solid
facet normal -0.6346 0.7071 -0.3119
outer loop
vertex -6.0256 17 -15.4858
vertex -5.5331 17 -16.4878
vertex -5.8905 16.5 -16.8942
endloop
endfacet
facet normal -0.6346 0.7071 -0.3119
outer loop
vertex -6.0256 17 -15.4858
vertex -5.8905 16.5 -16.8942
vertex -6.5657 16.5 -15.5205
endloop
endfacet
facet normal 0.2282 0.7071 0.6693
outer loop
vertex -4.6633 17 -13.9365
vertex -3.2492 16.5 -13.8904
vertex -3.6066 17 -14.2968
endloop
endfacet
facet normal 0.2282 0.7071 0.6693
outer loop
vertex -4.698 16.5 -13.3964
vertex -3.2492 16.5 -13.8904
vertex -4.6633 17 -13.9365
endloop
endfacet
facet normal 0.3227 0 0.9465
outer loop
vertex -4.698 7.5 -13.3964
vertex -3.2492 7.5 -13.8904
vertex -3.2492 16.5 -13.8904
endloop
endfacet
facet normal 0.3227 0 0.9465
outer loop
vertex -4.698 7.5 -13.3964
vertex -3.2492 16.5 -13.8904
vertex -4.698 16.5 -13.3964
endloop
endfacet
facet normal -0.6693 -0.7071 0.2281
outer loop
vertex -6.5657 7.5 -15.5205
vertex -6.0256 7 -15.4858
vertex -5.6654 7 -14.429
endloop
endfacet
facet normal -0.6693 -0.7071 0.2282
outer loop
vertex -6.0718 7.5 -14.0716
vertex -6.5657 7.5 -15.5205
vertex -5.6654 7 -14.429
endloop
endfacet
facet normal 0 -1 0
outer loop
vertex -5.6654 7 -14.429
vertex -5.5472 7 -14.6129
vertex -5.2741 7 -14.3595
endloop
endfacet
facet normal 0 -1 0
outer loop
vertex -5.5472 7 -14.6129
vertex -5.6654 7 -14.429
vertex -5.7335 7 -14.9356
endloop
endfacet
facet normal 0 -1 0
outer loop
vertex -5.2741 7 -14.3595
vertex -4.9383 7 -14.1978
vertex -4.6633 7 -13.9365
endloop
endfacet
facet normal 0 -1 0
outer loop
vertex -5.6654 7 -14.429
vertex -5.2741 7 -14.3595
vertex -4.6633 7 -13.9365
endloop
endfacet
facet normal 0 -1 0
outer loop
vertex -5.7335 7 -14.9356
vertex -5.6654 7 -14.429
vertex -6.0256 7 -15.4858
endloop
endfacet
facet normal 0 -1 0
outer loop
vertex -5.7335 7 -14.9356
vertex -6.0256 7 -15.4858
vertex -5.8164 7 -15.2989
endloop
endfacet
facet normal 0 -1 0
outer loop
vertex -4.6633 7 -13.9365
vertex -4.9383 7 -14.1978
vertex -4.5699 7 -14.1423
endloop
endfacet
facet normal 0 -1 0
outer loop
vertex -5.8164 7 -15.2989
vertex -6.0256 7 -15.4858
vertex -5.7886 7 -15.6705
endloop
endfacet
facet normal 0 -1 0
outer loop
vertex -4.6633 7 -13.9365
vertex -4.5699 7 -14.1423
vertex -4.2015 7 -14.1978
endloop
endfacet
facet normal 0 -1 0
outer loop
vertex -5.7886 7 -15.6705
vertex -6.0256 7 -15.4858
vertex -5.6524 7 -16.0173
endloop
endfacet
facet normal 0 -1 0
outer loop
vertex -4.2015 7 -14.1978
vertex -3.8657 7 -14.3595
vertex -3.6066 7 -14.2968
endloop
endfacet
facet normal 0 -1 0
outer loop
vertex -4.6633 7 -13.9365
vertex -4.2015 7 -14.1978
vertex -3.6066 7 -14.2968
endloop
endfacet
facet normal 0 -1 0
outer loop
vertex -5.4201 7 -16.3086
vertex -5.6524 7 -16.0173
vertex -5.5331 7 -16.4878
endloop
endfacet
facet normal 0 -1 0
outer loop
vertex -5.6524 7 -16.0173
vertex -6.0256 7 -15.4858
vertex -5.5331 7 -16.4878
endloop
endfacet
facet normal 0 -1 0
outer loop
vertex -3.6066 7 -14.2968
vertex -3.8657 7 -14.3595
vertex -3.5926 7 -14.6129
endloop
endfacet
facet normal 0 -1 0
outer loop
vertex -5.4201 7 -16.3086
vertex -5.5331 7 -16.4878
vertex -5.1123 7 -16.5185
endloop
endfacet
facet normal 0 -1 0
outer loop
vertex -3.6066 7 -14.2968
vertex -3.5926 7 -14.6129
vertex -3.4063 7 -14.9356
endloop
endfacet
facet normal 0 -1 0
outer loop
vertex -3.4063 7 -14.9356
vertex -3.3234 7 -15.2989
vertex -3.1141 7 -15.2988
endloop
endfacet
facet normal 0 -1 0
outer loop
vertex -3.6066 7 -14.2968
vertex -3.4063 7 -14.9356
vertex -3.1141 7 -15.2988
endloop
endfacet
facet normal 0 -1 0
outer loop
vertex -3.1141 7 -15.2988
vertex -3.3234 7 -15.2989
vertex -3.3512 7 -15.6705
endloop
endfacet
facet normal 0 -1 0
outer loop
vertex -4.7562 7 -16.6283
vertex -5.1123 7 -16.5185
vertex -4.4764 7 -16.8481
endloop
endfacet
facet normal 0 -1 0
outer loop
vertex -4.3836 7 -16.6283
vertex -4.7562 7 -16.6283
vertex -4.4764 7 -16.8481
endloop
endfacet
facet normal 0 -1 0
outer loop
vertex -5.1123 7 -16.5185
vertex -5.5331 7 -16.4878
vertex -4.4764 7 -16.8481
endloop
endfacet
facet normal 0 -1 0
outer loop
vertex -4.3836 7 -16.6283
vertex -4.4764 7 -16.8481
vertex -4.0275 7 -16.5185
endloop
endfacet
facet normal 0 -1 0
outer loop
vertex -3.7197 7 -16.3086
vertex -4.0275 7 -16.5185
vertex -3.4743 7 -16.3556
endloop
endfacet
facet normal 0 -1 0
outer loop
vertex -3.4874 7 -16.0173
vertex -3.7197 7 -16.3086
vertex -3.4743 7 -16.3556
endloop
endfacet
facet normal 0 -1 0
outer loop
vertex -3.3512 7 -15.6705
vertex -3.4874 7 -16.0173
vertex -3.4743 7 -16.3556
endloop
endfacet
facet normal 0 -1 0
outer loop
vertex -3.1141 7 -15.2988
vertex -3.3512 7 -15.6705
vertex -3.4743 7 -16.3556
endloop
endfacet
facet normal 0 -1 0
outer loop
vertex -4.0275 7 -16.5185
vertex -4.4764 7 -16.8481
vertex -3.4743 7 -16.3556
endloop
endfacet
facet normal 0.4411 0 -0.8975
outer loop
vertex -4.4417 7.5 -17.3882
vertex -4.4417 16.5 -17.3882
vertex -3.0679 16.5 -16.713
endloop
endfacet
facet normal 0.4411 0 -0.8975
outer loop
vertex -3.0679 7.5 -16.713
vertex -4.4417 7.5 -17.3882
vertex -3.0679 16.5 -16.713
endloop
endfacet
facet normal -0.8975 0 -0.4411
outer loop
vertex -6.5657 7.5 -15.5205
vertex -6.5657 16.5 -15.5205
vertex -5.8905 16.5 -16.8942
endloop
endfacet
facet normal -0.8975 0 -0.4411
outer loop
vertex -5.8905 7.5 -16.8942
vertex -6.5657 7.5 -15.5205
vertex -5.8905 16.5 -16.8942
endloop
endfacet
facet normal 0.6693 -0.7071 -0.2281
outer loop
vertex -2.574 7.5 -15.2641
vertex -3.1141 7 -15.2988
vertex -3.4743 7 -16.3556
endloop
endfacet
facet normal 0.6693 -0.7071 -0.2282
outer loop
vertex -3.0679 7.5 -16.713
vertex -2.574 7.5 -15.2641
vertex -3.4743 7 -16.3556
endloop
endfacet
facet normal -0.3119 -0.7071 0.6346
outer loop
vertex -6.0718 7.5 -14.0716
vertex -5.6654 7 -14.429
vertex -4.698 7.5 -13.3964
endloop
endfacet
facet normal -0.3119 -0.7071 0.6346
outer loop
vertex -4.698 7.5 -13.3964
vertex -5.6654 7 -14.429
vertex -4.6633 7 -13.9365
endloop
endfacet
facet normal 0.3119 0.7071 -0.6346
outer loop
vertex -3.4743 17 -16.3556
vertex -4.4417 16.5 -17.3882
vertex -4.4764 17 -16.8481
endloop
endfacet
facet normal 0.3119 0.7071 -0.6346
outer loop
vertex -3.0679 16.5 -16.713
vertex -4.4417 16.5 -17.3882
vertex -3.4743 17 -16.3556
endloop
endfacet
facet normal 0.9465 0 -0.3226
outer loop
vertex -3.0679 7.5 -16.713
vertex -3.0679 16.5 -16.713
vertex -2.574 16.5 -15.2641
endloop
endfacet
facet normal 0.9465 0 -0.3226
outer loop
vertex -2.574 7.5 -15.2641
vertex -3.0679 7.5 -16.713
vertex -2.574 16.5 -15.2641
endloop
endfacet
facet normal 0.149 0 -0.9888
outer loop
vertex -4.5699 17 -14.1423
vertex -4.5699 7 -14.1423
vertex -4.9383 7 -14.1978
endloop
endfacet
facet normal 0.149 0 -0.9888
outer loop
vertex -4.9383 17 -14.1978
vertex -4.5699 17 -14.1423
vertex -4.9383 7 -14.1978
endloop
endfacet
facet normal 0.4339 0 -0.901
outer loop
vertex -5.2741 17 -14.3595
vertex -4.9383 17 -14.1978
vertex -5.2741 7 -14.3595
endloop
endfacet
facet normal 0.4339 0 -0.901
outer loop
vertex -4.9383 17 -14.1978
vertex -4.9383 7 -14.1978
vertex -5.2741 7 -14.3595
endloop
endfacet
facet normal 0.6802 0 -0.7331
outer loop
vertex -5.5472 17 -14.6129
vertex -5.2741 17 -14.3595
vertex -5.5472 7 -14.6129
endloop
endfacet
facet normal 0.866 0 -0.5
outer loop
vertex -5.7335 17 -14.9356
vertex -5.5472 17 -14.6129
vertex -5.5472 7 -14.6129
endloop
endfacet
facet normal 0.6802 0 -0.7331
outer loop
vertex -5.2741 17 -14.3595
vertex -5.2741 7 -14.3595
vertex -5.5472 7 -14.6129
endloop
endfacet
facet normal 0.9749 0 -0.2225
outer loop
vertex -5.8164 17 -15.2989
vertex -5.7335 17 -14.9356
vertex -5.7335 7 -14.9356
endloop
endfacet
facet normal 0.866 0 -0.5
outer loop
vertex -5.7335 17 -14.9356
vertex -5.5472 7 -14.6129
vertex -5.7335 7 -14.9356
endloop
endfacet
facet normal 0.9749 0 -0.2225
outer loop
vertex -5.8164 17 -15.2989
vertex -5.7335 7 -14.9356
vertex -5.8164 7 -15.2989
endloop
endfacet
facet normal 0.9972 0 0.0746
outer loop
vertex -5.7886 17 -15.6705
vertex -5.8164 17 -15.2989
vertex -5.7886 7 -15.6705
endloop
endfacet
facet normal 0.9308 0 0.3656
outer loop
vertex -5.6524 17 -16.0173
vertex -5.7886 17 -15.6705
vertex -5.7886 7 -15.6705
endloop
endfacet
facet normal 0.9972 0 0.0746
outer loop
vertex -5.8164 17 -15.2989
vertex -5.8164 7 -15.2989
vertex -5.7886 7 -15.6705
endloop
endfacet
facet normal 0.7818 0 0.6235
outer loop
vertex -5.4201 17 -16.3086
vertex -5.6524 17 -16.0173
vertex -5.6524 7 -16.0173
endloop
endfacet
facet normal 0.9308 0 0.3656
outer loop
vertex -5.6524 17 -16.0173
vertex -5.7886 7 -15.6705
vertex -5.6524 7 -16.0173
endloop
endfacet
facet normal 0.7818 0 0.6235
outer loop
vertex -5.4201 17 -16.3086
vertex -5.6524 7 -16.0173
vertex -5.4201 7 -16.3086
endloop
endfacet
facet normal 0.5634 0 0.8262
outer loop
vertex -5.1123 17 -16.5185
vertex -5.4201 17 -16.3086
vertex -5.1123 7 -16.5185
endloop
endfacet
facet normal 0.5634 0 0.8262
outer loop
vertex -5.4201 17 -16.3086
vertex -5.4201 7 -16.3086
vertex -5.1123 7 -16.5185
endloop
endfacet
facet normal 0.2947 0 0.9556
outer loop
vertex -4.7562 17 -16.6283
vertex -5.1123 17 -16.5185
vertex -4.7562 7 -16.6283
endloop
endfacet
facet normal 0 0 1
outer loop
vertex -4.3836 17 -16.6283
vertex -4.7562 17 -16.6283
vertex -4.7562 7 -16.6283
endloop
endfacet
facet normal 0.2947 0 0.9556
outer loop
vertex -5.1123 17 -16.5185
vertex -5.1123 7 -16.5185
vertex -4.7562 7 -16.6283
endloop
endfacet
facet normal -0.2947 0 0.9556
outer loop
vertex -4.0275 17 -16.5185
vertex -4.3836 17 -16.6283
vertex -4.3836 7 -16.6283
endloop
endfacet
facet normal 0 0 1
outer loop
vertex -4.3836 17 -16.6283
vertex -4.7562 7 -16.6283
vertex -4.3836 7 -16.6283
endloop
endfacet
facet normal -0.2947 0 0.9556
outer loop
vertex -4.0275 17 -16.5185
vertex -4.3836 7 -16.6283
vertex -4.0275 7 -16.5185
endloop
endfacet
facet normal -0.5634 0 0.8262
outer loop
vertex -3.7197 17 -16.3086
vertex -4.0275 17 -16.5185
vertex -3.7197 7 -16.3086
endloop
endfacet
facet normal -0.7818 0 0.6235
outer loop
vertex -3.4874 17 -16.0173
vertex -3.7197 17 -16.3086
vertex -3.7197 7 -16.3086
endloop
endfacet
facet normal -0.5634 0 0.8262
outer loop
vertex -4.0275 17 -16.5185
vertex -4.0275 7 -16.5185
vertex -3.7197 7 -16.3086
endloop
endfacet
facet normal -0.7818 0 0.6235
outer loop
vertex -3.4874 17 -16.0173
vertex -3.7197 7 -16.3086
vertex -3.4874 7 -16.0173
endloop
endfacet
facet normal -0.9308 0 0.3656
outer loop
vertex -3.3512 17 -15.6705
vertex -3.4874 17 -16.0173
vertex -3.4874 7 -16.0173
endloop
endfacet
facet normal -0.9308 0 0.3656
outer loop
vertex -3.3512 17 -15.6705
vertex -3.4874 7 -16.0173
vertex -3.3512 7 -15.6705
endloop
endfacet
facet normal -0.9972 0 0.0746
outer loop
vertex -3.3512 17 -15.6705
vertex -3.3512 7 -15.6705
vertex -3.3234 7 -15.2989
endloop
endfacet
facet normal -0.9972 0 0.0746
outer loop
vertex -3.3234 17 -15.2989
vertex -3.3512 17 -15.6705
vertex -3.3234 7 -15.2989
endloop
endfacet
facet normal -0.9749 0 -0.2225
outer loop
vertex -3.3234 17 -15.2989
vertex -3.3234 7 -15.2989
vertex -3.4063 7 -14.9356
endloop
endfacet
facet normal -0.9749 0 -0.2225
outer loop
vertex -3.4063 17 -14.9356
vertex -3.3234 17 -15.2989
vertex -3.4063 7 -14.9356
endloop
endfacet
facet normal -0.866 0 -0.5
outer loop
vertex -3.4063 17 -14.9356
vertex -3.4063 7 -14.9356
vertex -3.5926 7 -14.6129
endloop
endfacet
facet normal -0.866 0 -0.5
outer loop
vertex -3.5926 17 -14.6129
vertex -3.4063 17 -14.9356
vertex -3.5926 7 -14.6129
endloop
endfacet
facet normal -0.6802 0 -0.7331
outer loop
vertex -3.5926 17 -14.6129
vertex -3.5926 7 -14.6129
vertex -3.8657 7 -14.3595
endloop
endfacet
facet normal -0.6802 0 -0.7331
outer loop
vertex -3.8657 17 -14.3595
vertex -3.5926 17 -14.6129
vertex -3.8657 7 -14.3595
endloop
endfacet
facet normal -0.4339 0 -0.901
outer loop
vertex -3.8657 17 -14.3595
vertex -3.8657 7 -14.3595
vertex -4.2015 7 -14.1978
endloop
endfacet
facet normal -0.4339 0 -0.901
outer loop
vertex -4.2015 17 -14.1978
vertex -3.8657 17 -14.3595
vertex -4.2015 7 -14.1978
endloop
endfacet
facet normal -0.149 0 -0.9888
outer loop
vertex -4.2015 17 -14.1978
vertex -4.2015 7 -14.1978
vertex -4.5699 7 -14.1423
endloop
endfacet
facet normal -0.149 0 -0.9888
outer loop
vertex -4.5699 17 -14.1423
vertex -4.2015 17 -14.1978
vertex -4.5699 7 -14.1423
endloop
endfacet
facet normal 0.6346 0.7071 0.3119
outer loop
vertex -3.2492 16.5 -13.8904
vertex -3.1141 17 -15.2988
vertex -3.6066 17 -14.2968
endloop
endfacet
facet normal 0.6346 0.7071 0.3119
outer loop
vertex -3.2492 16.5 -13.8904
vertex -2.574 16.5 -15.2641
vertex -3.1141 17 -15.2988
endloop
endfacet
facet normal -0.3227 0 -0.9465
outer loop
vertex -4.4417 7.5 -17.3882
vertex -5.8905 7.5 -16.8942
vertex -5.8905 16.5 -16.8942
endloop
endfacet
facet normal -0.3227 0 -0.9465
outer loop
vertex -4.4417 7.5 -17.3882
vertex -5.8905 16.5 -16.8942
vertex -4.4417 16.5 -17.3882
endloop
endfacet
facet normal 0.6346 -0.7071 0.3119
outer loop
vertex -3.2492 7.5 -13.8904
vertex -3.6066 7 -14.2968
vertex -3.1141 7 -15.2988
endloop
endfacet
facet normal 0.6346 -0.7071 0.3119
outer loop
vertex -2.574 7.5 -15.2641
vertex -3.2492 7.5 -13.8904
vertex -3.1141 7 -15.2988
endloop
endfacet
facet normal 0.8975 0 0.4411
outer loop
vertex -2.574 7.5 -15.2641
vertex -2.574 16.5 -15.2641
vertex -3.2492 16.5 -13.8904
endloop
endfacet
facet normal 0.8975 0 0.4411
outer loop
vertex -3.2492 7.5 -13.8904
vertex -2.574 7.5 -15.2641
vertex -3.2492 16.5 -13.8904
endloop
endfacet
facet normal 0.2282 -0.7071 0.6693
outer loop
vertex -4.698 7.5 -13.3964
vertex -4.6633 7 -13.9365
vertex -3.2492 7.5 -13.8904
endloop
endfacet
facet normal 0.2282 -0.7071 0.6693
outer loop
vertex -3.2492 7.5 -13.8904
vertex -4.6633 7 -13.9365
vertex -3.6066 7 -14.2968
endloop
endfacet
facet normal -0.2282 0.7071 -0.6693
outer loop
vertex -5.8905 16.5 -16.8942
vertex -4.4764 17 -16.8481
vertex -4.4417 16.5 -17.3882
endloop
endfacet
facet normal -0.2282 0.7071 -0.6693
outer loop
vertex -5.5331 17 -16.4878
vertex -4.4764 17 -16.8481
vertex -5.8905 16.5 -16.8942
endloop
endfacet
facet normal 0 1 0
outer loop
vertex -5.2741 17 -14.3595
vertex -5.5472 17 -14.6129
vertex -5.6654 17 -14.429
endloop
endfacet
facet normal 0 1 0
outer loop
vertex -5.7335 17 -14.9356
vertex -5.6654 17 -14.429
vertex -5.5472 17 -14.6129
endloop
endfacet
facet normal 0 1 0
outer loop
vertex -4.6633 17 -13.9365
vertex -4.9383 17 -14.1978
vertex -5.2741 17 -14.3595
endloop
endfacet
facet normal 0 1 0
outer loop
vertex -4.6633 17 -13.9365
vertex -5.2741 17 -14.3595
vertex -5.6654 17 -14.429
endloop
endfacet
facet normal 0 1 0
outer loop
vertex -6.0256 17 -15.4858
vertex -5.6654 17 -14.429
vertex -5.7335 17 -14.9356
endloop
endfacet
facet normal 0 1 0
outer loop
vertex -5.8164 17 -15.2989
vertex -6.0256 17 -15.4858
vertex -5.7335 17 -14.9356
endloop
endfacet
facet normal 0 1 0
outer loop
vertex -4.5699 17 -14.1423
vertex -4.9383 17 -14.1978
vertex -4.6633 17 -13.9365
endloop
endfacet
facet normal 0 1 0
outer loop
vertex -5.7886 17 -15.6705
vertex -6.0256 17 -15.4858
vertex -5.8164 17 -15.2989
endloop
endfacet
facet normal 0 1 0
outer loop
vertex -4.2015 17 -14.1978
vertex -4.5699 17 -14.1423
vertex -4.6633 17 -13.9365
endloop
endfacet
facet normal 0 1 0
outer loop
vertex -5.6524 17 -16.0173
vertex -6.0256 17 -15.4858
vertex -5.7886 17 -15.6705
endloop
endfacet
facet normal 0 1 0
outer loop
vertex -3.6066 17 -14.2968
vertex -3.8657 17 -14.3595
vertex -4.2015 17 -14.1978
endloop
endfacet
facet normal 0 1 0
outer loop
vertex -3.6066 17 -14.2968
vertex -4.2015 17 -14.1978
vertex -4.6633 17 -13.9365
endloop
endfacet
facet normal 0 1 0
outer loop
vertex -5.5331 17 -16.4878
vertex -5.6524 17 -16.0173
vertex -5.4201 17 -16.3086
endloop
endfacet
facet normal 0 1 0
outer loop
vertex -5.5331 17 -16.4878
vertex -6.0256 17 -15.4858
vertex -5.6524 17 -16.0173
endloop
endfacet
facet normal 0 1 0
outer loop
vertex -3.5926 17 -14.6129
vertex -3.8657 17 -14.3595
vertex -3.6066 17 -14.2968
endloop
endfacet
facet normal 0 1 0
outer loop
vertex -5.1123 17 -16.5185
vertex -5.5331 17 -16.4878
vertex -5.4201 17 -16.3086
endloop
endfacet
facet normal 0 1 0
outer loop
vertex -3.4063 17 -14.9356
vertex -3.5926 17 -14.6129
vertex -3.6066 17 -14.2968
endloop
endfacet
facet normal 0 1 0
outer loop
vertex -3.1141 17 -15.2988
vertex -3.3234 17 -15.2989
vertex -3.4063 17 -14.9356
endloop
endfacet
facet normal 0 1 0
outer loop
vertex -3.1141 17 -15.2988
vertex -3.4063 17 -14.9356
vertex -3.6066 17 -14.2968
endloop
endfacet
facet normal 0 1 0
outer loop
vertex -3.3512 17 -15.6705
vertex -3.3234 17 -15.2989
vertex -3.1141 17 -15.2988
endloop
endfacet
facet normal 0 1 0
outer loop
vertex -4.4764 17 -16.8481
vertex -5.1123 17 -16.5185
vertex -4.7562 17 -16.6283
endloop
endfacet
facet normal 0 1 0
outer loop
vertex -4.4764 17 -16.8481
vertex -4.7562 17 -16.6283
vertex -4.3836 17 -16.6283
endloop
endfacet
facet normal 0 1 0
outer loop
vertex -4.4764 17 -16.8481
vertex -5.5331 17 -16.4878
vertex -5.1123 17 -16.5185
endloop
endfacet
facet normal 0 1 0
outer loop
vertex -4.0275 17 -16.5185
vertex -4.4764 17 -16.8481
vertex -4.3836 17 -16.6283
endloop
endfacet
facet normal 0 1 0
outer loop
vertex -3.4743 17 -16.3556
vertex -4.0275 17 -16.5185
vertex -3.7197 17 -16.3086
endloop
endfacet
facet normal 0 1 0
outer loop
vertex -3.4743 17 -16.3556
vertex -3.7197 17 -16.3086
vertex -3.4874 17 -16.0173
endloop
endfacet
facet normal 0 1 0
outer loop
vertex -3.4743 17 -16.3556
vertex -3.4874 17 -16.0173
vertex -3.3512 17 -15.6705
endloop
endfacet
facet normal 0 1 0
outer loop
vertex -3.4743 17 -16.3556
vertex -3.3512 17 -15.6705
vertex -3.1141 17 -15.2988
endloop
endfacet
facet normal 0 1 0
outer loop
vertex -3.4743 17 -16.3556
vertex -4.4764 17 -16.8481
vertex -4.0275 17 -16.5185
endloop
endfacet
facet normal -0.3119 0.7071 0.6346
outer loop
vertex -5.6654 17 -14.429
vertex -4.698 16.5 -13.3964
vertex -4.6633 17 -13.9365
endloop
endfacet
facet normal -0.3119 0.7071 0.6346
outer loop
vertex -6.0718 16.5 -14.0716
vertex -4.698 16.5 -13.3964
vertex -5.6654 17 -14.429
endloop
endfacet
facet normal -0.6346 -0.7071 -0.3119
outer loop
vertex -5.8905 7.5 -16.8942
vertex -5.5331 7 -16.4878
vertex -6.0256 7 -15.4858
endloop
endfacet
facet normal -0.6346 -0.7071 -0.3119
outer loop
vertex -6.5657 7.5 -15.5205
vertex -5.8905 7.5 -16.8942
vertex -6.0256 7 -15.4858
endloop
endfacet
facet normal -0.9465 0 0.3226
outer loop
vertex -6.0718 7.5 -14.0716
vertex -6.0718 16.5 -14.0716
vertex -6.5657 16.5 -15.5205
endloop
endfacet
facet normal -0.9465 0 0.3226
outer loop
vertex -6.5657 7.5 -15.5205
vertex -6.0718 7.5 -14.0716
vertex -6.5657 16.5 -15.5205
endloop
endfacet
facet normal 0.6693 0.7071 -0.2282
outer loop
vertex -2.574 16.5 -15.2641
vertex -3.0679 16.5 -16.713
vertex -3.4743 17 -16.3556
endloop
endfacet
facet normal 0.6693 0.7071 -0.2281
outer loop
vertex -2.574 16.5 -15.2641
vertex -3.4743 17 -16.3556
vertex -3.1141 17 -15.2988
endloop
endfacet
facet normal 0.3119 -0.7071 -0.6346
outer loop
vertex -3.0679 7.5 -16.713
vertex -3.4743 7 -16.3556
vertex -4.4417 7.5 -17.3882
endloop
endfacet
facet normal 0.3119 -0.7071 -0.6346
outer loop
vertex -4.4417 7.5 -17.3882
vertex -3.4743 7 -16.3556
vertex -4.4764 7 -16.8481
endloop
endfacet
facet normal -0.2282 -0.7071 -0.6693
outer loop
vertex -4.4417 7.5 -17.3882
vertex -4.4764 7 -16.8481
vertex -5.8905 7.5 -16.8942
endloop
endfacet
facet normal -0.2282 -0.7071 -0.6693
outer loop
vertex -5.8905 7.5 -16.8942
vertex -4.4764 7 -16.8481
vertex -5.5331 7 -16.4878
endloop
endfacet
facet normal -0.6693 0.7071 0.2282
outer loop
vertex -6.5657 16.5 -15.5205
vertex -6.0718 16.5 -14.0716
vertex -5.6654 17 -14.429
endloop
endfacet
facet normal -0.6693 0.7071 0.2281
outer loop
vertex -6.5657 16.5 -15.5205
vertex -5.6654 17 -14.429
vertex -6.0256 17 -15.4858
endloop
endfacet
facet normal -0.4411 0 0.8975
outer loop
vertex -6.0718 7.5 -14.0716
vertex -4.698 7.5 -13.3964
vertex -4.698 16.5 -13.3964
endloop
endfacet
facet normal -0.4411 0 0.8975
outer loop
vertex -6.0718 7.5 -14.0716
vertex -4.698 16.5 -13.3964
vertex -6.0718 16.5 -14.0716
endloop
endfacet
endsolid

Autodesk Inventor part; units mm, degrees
ref_plane "YZ Plane" through (0, 0, 0) normal (1, 0, 0) x (0, 1, 0)
ref_plane "XZ Plane" through (0, 0, 0) normal (0, 1, 0) x (-1, 0, 0)
ref_plane "XY Plane" through (0, 0, 0) normal (0, 0, 1) x (1, 0, 0)
ref_plane "Work Plane1" through (-10, 7, -20) normal (0, 1, 0) x (1, 0, 0)
sketch "Sketch3" plane through (-10, 7, -20) normal (0, 1, 0) x (1, 0, 0)
  circle A0 centre (5.4301, -4.6077) radius 2 construction
  line L0 (4.1095, -3.1058) -> (5.5583, -2.6118)
  line L1 (5.5583, -2.6118) -> (6.9321, -3.287)
  line L2 (6.9321, -3.287) -> (7.426, -4.7359)
  line L3 (7.426, -4.7359) -> (6.7508, -6.1096)
  line L4 (6.7508, -6.1096) -> (5.302, -6.6036)
  line L5 (5.302, -6.6036) -> (3.9282, -5.9284)
  line L6 (3.9282, -5.9284) -> (3.4343, -4.4795)
  line L7 (3.4343, -4.4795) -> (4.1095, -3.1058)
  point P0 (10, -20)
extrude "Extrusion1" add sketch "Sketch3" along normal blind 10
chamfer "Chamfer1" distance 0.5 angle 45 8 edges at (-3.9736, 7, -13.6434) (-2.9116, 7, -14.5772) (-2.8209, 7, -15.9886) (-3.7548, 7, -17.0506) (-5.1661, 7, -17.1412) (-6.2281, 7, -16.2073) (-6.3188, 7, -14.796) (-5.3849, 7, -13.734)
chamfer "Chamfer2" distance 0.5 angle 45 8 edges at (-5.3849, 17, -13.734) (-3.9736, 17, -13.6434) (-6.3188, 17, -14.796) (-6.2281, 17, -16.2073) (-5.1661, 17, -17.1412) (-3.7548, 17, -17.0506) (-2.8209, 17, -15.9886) (-2.9116, 17, -14.5772)
sketch "Sketch4" plane through (-10, 17, -20) normal (0, 1, 0) x (1, 0, 0)
  line L0 (5.5236, -3.1519) -> (6.5257, -3.6444) construction
  line L1 (4.4668, -3.5122) -> (5.5236, -3.1519) construction
  line L2 (3.9743, -4.5142) -> (4.4668, -3.5122) construction
  line L3 (4.3346, -5.571) -> (3.9743, -4.5142) construction
  line L4 (5.3367, -6.0635) -> (4.3346, -5.571) construction
  line L5 (6.3935, -5.7032) -> (5.3367, -6.0635) construction
  line L6 (6.886, -4.7012) -> (6.3935, -5.7032) construction
  line L7 (6.5257, -3.6444) -> (6.886, -4.7012) construction
  point P0 (10, -20)
  point P1 (5.4301, -4.6077)
hole "Hole1" at (-4.5699, 17, -15.3923) direction (0, -1, 0) diameter 2.5 end through all
properties part number "pin_oct_4mm"
